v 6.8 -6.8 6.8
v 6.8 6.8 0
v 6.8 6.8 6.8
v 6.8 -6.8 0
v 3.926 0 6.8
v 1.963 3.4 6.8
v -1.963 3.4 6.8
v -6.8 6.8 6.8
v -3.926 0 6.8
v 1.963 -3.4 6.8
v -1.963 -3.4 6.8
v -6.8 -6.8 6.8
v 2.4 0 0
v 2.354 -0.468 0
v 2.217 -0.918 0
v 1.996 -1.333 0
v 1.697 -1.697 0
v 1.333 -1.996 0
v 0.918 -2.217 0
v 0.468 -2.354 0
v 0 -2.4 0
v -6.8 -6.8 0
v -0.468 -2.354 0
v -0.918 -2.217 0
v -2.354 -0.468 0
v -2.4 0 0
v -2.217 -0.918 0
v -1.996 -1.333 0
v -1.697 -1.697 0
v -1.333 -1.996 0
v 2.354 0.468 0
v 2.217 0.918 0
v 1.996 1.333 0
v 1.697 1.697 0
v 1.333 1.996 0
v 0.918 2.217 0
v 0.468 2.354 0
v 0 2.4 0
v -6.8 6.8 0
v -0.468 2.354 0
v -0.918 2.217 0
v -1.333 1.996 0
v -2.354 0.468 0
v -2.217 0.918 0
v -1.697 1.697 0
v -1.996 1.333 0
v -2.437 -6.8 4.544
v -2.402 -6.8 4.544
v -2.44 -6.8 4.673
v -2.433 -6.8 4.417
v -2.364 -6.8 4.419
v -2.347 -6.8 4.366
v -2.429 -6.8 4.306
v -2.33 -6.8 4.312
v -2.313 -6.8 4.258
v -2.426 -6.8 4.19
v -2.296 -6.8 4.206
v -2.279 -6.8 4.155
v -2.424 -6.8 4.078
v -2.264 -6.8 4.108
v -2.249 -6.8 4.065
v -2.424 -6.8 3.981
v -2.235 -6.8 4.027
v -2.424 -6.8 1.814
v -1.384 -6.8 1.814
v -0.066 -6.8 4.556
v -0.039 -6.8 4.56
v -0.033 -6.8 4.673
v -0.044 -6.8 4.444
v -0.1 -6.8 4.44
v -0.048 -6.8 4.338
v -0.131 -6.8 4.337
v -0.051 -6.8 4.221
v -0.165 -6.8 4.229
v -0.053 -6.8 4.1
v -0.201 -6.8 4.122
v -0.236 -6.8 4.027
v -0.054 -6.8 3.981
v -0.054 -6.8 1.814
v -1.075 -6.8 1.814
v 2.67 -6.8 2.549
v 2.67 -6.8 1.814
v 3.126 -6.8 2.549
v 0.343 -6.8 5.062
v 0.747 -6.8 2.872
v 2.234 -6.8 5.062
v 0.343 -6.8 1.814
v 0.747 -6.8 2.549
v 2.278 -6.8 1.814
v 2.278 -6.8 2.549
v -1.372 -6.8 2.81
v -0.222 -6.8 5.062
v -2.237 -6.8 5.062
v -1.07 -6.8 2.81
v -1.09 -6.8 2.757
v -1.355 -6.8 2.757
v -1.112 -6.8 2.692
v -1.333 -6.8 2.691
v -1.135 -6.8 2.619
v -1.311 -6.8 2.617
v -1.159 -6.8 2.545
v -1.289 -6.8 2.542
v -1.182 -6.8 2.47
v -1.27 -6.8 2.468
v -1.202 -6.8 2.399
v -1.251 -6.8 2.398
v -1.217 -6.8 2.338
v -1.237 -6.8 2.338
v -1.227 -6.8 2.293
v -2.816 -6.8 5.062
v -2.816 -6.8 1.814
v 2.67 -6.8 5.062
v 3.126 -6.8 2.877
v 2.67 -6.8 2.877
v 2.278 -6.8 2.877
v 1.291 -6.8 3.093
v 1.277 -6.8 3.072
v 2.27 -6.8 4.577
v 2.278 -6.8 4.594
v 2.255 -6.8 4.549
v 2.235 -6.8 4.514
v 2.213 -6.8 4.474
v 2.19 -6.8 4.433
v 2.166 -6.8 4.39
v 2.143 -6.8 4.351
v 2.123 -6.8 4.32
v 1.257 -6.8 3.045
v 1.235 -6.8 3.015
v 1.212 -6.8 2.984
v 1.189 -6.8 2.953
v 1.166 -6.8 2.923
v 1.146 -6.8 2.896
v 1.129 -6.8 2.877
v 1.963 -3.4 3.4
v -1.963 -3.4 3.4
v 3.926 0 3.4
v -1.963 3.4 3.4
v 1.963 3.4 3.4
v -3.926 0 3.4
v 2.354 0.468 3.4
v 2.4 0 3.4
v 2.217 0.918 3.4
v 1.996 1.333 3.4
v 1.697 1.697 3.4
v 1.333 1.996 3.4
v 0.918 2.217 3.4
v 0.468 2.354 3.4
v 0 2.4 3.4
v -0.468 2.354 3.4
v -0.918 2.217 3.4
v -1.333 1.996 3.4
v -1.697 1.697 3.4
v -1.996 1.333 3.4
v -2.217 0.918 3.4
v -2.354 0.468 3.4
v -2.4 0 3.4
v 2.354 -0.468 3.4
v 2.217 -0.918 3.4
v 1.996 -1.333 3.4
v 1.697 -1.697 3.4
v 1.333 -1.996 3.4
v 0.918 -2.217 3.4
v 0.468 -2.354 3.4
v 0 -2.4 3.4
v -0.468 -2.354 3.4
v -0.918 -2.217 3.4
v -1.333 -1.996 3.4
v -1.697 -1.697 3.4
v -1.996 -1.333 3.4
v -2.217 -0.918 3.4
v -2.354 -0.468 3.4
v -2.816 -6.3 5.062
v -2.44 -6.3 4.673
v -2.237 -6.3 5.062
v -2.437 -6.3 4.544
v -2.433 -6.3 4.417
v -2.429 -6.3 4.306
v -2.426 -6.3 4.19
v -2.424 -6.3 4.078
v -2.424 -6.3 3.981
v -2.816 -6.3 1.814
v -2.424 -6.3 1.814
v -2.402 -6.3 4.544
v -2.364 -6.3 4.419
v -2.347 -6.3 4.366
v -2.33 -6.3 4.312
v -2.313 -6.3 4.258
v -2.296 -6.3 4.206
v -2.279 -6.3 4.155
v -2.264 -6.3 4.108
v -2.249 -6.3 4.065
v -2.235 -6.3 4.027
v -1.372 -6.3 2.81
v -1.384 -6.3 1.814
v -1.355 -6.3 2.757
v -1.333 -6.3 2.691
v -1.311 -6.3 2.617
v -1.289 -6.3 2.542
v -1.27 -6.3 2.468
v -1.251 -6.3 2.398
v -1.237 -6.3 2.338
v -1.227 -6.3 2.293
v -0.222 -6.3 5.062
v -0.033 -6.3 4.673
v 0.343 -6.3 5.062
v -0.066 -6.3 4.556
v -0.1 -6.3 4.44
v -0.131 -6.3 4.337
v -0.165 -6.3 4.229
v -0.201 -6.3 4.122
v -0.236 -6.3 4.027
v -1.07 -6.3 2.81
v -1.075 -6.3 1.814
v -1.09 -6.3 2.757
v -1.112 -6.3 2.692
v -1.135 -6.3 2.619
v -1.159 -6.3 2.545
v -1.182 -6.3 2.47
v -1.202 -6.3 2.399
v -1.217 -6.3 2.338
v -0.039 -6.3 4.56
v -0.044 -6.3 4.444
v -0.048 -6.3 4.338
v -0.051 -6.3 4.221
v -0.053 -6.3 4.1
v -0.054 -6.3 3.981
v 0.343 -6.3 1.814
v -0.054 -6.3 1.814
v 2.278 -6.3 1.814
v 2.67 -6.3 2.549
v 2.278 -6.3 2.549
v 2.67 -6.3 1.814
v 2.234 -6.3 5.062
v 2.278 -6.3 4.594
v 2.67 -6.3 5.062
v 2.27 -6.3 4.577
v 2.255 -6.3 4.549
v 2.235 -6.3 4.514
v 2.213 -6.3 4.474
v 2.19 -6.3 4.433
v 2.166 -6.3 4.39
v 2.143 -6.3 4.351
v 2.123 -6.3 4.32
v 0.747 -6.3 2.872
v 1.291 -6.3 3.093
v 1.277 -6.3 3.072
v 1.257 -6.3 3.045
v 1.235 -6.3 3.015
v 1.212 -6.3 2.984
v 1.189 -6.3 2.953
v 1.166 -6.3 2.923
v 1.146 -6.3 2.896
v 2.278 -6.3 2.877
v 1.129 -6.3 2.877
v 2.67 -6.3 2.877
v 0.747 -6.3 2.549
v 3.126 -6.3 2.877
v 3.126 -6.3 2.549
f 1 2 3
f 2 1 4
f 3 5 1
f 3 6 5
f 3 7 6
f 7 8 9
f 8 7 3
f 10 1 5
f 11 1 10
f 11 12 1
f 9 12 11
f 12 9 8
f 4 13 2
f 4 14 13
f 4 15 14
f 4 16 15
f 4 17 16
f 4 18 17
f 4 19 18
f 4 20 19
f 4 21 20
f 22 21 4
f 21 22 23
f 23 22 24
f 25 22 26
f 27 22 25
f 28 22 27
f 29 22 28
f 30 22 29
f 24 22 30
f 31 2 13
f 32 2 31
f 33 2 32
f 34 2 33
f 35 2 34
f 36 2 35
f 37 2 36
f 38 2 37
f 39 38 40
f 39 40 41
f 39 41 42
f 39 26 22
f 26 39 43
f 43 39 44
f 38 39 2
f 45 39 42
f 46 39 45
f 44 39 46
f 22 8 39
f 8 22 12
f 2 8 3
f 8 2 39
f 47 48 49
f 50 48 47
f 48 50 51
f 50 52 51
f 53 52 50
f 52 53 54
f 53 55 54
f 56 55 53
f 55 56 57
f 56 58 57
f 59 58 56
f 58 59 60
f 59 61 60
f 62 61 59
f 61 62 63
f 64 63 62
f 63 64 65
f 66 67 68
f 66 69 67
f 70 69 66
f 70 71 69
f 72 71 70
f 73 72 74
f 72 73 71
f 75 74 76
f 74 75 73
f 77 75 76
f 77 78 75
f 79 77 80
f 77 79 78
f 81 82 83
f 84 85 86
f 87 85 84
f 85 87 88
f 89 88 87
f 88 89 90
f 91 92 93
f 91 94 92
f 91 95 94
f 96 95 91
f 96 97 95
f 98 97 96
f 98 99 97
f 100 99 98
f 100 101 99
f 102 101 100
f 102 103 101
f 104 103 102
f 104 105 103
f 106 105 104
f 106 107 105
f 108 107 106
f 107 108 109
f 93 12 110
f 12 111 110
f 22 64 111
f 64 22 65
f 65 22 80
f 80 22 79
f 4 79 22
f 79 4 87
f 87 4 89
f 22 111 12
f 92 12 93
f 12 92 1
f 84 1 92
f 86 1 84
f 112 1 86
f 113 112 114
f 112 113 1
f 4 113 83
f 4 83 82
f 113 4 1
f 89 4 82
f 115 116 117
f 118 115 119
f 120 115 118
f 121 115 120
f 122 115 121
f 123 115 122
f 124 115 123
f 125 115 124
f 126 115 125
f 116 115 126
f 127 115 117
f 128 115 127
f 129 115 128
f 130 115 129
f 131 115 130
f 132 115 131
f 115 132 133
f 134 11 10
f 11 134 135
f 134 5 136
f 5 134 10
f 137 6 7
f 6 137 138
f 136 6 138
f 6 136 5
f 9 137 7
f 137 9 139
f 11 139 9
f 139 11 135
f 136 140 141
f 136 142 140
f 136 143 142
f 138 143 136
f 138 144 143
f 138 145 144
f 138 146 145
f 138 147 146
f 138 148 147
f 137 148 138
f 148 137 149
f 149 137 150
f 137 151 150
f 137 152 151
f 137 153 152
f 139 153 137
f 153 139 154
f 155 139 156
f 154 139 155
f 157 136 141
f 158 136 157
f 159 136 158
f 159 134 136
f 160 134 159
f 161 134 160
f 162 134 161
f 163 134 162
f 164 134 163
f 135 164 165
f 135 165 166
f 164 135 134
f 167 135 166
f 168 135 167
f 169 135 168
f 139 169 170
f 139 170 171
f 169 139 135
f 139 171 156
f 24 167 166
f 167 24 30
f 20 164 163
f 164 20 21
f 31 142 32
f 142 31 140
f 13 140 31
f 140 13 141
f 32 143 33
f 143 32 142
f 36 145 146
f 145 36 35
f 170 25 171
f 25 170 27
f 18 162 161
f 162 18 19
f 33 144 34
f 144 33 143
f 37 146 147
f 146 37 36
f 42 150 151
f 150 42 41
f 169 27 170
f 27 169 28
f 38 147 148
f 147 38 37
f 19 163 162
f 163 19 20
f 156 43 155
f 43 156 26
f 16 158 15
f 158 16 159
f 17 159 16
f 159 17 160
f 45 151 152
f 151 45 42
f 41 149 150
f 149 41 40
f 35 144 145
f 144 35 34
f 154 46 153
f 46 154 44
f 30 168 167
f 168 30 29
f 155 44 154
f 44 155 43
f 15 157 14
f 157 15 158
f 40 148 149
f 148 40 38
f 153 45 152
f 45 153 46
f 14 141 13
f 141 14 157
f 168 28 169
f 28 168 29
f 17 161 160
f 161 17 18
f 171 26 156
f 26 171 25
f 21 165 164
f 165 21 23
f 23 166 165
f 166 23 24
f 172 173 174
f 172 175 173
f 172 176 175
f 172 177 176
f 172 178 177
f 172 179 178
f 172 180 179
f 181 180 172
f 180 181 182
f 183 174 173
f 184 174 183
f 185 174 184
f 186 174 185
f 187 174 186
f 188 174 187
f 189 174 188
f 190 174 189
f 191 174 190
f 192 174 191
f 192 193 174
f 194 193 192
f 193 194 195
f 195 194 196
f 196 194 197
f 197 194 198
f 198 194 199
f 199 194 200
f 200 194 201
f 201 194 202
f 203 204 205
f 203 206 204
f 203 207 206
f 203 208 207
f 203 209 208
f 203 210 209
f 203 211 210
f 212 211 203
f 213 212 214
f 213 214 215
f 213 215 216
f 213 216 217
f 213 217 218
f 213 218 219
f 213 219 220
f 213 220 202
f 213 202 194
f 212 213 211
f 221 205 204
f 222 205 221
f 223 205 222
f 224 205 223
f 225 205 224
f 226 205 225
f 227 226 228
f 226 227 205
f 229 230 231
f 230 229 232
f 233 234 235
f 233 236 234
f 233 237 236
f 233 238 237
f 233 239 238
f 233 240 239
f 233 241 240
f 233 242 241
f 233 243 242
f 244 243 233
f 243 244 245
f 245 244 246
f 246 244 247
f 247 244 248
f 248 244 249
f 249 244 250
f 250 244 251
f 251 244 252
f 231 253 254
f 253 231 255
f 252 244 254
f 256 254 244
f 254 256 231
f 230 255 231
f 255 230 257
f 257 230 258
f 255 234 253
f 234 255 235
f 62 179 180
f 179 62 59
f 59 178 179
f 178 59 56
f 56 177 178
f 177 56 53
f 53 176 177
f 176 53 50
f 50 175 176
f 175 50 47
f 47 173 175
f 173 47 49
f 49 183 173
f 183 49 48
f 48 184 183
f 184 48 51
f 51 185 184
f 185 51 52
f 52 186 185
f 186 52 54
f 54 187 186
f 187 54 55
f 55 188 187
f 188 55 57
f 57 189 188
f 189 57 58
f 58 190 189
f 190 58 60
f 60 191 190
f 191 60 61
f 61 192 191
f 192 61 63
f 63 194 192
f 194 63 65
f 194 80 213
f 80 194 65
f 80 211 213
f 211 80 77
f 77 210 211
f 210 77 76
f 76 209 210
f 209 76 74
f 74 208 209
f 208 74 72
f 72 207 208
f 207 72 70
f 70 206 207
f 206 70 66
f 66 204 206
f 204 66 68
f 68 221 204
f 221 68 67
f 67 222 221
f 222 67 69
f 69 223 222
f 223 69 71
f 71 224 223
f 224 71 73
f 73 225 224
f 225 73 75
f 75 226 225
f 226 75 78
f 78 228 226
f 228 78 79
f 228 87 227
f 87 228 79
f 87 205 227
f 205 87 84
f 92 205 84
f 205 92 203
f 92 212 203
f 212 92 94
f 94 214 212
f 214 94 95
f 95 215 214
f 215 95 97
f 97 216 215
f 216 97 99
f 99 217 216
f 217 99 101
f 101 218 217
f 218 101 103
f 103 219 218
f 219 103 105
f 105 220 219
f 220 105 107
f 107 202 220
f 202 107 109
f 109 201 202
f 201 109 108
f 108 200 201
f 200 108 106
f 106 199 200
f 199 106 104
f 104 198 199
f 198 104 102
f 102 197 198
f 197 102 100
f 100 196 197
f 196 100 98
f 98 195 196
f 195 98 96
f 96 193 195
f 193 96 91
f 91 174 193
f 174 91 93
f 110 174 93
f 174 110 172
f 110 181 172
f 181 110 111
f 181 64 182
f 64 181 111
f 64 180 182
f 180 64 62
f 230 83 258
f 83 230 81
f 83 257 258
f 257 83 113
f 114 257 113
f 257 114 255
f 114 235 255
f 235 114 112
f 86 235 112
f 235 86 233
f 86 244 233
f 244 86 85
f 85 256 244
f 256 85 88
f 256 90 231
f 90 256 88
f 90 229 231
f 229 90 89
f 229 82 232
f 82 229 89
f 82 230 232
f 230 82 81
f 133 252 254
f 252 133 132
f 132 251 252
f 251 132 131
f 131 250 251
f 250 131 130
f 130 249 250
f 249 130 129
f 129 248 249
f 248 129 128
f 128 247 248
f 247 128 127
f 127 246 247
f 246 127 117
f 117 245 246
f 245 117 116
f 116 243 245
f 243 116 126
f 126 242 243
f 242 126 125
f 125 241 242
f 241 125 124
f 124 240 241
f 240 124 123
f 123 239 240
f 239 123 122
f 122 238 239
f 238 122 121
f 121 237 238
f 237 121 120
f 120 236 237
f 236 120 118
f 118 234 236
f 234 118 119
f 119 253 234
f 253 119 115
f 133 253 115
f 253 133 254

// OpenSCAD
//By Coat, 11-april-2019
//Licensed under the Creative Commons - Attribution license.
//Sawhelp for shorten bolts and machine screws, useable calibrationcube

/* [Nut or Bolt] */
//Width nut or bolt head (mm, flat side to flatside), make it a little smaller, so you can press in the nut. 
wsize = 6.8; //[1:0.1:20] 
//Height/depth of nut   (mm, if 0 -> wsize/2)
nutheight = 0; //[0:0.1:10]
//Hole fo threat (mm, if 0 -> wsize-2, make it bigger then actual size and smaller then wsize)
threadholediam = 0; //[0:0.1:20]

/* [Cube] */
//Width of cube (mm, if 0 -> two times wsize)
cubewidth = 0; //[0:1:40]
//Height of cube (mm, if 0 -> two times nutheight)
cubeheight = 0;  //[0:1:40]   

/* [text, optional] */
//Font
textfont = "Arial";
//Text for each vertical side
cubetext1 = "M4";
cubetext2 = "";
cubetext3 = "";
cubetext4 = "";
//Fontsize = this factor * cubeheight
textsizefactor= 0.5; //[0:0.05:1]

//---Modules---
module cylinsert(dd, hh,ff,rr)  //diameter,height,fn,angle
{
  $fn = ff;
  rotate([0,0,rr])
    cylinder(d = dd, h = hh, center= true);
}

module textoncube(tt,zr)
{
  if (tt!="")
  {
    rotate([0,0,zr])
    translate([0,-cw/2,0])
      rotate([90,0,0])
        linear_extrude(height = 1, center = true)
          text(tt, size = ch*textsizefactor, font = textfont, halign="center",valign="center",spacing = 1);
  }  
}  

//----Thing---

//secondary parameters
nh= nutheight==0?wsize/2:nutheight;
thd = threadholediam==0?wsize-2:threadholediam;
cw= cubewidth==0?wsize*2:cubewidth;
ch= cubeheight==0?nh*2:cubeheight;

translate([0,0,ch/2])
  difference()
  {
    cube([cw,cw,ch], center = true);
    translate([0,0,ch/2])
      cylinsert(wsize/sqrt(0.75), nh*2,6,0); //hole to fit nut/bolt
    cylinsert(thd, ch*2,32,0); //hole for thread 
    textoncube(cubetext1,0);
    textoncube(cubetext2,90);
    textoncube(cubetext3,180);
    textoncube(cubetext4,270);
  }
